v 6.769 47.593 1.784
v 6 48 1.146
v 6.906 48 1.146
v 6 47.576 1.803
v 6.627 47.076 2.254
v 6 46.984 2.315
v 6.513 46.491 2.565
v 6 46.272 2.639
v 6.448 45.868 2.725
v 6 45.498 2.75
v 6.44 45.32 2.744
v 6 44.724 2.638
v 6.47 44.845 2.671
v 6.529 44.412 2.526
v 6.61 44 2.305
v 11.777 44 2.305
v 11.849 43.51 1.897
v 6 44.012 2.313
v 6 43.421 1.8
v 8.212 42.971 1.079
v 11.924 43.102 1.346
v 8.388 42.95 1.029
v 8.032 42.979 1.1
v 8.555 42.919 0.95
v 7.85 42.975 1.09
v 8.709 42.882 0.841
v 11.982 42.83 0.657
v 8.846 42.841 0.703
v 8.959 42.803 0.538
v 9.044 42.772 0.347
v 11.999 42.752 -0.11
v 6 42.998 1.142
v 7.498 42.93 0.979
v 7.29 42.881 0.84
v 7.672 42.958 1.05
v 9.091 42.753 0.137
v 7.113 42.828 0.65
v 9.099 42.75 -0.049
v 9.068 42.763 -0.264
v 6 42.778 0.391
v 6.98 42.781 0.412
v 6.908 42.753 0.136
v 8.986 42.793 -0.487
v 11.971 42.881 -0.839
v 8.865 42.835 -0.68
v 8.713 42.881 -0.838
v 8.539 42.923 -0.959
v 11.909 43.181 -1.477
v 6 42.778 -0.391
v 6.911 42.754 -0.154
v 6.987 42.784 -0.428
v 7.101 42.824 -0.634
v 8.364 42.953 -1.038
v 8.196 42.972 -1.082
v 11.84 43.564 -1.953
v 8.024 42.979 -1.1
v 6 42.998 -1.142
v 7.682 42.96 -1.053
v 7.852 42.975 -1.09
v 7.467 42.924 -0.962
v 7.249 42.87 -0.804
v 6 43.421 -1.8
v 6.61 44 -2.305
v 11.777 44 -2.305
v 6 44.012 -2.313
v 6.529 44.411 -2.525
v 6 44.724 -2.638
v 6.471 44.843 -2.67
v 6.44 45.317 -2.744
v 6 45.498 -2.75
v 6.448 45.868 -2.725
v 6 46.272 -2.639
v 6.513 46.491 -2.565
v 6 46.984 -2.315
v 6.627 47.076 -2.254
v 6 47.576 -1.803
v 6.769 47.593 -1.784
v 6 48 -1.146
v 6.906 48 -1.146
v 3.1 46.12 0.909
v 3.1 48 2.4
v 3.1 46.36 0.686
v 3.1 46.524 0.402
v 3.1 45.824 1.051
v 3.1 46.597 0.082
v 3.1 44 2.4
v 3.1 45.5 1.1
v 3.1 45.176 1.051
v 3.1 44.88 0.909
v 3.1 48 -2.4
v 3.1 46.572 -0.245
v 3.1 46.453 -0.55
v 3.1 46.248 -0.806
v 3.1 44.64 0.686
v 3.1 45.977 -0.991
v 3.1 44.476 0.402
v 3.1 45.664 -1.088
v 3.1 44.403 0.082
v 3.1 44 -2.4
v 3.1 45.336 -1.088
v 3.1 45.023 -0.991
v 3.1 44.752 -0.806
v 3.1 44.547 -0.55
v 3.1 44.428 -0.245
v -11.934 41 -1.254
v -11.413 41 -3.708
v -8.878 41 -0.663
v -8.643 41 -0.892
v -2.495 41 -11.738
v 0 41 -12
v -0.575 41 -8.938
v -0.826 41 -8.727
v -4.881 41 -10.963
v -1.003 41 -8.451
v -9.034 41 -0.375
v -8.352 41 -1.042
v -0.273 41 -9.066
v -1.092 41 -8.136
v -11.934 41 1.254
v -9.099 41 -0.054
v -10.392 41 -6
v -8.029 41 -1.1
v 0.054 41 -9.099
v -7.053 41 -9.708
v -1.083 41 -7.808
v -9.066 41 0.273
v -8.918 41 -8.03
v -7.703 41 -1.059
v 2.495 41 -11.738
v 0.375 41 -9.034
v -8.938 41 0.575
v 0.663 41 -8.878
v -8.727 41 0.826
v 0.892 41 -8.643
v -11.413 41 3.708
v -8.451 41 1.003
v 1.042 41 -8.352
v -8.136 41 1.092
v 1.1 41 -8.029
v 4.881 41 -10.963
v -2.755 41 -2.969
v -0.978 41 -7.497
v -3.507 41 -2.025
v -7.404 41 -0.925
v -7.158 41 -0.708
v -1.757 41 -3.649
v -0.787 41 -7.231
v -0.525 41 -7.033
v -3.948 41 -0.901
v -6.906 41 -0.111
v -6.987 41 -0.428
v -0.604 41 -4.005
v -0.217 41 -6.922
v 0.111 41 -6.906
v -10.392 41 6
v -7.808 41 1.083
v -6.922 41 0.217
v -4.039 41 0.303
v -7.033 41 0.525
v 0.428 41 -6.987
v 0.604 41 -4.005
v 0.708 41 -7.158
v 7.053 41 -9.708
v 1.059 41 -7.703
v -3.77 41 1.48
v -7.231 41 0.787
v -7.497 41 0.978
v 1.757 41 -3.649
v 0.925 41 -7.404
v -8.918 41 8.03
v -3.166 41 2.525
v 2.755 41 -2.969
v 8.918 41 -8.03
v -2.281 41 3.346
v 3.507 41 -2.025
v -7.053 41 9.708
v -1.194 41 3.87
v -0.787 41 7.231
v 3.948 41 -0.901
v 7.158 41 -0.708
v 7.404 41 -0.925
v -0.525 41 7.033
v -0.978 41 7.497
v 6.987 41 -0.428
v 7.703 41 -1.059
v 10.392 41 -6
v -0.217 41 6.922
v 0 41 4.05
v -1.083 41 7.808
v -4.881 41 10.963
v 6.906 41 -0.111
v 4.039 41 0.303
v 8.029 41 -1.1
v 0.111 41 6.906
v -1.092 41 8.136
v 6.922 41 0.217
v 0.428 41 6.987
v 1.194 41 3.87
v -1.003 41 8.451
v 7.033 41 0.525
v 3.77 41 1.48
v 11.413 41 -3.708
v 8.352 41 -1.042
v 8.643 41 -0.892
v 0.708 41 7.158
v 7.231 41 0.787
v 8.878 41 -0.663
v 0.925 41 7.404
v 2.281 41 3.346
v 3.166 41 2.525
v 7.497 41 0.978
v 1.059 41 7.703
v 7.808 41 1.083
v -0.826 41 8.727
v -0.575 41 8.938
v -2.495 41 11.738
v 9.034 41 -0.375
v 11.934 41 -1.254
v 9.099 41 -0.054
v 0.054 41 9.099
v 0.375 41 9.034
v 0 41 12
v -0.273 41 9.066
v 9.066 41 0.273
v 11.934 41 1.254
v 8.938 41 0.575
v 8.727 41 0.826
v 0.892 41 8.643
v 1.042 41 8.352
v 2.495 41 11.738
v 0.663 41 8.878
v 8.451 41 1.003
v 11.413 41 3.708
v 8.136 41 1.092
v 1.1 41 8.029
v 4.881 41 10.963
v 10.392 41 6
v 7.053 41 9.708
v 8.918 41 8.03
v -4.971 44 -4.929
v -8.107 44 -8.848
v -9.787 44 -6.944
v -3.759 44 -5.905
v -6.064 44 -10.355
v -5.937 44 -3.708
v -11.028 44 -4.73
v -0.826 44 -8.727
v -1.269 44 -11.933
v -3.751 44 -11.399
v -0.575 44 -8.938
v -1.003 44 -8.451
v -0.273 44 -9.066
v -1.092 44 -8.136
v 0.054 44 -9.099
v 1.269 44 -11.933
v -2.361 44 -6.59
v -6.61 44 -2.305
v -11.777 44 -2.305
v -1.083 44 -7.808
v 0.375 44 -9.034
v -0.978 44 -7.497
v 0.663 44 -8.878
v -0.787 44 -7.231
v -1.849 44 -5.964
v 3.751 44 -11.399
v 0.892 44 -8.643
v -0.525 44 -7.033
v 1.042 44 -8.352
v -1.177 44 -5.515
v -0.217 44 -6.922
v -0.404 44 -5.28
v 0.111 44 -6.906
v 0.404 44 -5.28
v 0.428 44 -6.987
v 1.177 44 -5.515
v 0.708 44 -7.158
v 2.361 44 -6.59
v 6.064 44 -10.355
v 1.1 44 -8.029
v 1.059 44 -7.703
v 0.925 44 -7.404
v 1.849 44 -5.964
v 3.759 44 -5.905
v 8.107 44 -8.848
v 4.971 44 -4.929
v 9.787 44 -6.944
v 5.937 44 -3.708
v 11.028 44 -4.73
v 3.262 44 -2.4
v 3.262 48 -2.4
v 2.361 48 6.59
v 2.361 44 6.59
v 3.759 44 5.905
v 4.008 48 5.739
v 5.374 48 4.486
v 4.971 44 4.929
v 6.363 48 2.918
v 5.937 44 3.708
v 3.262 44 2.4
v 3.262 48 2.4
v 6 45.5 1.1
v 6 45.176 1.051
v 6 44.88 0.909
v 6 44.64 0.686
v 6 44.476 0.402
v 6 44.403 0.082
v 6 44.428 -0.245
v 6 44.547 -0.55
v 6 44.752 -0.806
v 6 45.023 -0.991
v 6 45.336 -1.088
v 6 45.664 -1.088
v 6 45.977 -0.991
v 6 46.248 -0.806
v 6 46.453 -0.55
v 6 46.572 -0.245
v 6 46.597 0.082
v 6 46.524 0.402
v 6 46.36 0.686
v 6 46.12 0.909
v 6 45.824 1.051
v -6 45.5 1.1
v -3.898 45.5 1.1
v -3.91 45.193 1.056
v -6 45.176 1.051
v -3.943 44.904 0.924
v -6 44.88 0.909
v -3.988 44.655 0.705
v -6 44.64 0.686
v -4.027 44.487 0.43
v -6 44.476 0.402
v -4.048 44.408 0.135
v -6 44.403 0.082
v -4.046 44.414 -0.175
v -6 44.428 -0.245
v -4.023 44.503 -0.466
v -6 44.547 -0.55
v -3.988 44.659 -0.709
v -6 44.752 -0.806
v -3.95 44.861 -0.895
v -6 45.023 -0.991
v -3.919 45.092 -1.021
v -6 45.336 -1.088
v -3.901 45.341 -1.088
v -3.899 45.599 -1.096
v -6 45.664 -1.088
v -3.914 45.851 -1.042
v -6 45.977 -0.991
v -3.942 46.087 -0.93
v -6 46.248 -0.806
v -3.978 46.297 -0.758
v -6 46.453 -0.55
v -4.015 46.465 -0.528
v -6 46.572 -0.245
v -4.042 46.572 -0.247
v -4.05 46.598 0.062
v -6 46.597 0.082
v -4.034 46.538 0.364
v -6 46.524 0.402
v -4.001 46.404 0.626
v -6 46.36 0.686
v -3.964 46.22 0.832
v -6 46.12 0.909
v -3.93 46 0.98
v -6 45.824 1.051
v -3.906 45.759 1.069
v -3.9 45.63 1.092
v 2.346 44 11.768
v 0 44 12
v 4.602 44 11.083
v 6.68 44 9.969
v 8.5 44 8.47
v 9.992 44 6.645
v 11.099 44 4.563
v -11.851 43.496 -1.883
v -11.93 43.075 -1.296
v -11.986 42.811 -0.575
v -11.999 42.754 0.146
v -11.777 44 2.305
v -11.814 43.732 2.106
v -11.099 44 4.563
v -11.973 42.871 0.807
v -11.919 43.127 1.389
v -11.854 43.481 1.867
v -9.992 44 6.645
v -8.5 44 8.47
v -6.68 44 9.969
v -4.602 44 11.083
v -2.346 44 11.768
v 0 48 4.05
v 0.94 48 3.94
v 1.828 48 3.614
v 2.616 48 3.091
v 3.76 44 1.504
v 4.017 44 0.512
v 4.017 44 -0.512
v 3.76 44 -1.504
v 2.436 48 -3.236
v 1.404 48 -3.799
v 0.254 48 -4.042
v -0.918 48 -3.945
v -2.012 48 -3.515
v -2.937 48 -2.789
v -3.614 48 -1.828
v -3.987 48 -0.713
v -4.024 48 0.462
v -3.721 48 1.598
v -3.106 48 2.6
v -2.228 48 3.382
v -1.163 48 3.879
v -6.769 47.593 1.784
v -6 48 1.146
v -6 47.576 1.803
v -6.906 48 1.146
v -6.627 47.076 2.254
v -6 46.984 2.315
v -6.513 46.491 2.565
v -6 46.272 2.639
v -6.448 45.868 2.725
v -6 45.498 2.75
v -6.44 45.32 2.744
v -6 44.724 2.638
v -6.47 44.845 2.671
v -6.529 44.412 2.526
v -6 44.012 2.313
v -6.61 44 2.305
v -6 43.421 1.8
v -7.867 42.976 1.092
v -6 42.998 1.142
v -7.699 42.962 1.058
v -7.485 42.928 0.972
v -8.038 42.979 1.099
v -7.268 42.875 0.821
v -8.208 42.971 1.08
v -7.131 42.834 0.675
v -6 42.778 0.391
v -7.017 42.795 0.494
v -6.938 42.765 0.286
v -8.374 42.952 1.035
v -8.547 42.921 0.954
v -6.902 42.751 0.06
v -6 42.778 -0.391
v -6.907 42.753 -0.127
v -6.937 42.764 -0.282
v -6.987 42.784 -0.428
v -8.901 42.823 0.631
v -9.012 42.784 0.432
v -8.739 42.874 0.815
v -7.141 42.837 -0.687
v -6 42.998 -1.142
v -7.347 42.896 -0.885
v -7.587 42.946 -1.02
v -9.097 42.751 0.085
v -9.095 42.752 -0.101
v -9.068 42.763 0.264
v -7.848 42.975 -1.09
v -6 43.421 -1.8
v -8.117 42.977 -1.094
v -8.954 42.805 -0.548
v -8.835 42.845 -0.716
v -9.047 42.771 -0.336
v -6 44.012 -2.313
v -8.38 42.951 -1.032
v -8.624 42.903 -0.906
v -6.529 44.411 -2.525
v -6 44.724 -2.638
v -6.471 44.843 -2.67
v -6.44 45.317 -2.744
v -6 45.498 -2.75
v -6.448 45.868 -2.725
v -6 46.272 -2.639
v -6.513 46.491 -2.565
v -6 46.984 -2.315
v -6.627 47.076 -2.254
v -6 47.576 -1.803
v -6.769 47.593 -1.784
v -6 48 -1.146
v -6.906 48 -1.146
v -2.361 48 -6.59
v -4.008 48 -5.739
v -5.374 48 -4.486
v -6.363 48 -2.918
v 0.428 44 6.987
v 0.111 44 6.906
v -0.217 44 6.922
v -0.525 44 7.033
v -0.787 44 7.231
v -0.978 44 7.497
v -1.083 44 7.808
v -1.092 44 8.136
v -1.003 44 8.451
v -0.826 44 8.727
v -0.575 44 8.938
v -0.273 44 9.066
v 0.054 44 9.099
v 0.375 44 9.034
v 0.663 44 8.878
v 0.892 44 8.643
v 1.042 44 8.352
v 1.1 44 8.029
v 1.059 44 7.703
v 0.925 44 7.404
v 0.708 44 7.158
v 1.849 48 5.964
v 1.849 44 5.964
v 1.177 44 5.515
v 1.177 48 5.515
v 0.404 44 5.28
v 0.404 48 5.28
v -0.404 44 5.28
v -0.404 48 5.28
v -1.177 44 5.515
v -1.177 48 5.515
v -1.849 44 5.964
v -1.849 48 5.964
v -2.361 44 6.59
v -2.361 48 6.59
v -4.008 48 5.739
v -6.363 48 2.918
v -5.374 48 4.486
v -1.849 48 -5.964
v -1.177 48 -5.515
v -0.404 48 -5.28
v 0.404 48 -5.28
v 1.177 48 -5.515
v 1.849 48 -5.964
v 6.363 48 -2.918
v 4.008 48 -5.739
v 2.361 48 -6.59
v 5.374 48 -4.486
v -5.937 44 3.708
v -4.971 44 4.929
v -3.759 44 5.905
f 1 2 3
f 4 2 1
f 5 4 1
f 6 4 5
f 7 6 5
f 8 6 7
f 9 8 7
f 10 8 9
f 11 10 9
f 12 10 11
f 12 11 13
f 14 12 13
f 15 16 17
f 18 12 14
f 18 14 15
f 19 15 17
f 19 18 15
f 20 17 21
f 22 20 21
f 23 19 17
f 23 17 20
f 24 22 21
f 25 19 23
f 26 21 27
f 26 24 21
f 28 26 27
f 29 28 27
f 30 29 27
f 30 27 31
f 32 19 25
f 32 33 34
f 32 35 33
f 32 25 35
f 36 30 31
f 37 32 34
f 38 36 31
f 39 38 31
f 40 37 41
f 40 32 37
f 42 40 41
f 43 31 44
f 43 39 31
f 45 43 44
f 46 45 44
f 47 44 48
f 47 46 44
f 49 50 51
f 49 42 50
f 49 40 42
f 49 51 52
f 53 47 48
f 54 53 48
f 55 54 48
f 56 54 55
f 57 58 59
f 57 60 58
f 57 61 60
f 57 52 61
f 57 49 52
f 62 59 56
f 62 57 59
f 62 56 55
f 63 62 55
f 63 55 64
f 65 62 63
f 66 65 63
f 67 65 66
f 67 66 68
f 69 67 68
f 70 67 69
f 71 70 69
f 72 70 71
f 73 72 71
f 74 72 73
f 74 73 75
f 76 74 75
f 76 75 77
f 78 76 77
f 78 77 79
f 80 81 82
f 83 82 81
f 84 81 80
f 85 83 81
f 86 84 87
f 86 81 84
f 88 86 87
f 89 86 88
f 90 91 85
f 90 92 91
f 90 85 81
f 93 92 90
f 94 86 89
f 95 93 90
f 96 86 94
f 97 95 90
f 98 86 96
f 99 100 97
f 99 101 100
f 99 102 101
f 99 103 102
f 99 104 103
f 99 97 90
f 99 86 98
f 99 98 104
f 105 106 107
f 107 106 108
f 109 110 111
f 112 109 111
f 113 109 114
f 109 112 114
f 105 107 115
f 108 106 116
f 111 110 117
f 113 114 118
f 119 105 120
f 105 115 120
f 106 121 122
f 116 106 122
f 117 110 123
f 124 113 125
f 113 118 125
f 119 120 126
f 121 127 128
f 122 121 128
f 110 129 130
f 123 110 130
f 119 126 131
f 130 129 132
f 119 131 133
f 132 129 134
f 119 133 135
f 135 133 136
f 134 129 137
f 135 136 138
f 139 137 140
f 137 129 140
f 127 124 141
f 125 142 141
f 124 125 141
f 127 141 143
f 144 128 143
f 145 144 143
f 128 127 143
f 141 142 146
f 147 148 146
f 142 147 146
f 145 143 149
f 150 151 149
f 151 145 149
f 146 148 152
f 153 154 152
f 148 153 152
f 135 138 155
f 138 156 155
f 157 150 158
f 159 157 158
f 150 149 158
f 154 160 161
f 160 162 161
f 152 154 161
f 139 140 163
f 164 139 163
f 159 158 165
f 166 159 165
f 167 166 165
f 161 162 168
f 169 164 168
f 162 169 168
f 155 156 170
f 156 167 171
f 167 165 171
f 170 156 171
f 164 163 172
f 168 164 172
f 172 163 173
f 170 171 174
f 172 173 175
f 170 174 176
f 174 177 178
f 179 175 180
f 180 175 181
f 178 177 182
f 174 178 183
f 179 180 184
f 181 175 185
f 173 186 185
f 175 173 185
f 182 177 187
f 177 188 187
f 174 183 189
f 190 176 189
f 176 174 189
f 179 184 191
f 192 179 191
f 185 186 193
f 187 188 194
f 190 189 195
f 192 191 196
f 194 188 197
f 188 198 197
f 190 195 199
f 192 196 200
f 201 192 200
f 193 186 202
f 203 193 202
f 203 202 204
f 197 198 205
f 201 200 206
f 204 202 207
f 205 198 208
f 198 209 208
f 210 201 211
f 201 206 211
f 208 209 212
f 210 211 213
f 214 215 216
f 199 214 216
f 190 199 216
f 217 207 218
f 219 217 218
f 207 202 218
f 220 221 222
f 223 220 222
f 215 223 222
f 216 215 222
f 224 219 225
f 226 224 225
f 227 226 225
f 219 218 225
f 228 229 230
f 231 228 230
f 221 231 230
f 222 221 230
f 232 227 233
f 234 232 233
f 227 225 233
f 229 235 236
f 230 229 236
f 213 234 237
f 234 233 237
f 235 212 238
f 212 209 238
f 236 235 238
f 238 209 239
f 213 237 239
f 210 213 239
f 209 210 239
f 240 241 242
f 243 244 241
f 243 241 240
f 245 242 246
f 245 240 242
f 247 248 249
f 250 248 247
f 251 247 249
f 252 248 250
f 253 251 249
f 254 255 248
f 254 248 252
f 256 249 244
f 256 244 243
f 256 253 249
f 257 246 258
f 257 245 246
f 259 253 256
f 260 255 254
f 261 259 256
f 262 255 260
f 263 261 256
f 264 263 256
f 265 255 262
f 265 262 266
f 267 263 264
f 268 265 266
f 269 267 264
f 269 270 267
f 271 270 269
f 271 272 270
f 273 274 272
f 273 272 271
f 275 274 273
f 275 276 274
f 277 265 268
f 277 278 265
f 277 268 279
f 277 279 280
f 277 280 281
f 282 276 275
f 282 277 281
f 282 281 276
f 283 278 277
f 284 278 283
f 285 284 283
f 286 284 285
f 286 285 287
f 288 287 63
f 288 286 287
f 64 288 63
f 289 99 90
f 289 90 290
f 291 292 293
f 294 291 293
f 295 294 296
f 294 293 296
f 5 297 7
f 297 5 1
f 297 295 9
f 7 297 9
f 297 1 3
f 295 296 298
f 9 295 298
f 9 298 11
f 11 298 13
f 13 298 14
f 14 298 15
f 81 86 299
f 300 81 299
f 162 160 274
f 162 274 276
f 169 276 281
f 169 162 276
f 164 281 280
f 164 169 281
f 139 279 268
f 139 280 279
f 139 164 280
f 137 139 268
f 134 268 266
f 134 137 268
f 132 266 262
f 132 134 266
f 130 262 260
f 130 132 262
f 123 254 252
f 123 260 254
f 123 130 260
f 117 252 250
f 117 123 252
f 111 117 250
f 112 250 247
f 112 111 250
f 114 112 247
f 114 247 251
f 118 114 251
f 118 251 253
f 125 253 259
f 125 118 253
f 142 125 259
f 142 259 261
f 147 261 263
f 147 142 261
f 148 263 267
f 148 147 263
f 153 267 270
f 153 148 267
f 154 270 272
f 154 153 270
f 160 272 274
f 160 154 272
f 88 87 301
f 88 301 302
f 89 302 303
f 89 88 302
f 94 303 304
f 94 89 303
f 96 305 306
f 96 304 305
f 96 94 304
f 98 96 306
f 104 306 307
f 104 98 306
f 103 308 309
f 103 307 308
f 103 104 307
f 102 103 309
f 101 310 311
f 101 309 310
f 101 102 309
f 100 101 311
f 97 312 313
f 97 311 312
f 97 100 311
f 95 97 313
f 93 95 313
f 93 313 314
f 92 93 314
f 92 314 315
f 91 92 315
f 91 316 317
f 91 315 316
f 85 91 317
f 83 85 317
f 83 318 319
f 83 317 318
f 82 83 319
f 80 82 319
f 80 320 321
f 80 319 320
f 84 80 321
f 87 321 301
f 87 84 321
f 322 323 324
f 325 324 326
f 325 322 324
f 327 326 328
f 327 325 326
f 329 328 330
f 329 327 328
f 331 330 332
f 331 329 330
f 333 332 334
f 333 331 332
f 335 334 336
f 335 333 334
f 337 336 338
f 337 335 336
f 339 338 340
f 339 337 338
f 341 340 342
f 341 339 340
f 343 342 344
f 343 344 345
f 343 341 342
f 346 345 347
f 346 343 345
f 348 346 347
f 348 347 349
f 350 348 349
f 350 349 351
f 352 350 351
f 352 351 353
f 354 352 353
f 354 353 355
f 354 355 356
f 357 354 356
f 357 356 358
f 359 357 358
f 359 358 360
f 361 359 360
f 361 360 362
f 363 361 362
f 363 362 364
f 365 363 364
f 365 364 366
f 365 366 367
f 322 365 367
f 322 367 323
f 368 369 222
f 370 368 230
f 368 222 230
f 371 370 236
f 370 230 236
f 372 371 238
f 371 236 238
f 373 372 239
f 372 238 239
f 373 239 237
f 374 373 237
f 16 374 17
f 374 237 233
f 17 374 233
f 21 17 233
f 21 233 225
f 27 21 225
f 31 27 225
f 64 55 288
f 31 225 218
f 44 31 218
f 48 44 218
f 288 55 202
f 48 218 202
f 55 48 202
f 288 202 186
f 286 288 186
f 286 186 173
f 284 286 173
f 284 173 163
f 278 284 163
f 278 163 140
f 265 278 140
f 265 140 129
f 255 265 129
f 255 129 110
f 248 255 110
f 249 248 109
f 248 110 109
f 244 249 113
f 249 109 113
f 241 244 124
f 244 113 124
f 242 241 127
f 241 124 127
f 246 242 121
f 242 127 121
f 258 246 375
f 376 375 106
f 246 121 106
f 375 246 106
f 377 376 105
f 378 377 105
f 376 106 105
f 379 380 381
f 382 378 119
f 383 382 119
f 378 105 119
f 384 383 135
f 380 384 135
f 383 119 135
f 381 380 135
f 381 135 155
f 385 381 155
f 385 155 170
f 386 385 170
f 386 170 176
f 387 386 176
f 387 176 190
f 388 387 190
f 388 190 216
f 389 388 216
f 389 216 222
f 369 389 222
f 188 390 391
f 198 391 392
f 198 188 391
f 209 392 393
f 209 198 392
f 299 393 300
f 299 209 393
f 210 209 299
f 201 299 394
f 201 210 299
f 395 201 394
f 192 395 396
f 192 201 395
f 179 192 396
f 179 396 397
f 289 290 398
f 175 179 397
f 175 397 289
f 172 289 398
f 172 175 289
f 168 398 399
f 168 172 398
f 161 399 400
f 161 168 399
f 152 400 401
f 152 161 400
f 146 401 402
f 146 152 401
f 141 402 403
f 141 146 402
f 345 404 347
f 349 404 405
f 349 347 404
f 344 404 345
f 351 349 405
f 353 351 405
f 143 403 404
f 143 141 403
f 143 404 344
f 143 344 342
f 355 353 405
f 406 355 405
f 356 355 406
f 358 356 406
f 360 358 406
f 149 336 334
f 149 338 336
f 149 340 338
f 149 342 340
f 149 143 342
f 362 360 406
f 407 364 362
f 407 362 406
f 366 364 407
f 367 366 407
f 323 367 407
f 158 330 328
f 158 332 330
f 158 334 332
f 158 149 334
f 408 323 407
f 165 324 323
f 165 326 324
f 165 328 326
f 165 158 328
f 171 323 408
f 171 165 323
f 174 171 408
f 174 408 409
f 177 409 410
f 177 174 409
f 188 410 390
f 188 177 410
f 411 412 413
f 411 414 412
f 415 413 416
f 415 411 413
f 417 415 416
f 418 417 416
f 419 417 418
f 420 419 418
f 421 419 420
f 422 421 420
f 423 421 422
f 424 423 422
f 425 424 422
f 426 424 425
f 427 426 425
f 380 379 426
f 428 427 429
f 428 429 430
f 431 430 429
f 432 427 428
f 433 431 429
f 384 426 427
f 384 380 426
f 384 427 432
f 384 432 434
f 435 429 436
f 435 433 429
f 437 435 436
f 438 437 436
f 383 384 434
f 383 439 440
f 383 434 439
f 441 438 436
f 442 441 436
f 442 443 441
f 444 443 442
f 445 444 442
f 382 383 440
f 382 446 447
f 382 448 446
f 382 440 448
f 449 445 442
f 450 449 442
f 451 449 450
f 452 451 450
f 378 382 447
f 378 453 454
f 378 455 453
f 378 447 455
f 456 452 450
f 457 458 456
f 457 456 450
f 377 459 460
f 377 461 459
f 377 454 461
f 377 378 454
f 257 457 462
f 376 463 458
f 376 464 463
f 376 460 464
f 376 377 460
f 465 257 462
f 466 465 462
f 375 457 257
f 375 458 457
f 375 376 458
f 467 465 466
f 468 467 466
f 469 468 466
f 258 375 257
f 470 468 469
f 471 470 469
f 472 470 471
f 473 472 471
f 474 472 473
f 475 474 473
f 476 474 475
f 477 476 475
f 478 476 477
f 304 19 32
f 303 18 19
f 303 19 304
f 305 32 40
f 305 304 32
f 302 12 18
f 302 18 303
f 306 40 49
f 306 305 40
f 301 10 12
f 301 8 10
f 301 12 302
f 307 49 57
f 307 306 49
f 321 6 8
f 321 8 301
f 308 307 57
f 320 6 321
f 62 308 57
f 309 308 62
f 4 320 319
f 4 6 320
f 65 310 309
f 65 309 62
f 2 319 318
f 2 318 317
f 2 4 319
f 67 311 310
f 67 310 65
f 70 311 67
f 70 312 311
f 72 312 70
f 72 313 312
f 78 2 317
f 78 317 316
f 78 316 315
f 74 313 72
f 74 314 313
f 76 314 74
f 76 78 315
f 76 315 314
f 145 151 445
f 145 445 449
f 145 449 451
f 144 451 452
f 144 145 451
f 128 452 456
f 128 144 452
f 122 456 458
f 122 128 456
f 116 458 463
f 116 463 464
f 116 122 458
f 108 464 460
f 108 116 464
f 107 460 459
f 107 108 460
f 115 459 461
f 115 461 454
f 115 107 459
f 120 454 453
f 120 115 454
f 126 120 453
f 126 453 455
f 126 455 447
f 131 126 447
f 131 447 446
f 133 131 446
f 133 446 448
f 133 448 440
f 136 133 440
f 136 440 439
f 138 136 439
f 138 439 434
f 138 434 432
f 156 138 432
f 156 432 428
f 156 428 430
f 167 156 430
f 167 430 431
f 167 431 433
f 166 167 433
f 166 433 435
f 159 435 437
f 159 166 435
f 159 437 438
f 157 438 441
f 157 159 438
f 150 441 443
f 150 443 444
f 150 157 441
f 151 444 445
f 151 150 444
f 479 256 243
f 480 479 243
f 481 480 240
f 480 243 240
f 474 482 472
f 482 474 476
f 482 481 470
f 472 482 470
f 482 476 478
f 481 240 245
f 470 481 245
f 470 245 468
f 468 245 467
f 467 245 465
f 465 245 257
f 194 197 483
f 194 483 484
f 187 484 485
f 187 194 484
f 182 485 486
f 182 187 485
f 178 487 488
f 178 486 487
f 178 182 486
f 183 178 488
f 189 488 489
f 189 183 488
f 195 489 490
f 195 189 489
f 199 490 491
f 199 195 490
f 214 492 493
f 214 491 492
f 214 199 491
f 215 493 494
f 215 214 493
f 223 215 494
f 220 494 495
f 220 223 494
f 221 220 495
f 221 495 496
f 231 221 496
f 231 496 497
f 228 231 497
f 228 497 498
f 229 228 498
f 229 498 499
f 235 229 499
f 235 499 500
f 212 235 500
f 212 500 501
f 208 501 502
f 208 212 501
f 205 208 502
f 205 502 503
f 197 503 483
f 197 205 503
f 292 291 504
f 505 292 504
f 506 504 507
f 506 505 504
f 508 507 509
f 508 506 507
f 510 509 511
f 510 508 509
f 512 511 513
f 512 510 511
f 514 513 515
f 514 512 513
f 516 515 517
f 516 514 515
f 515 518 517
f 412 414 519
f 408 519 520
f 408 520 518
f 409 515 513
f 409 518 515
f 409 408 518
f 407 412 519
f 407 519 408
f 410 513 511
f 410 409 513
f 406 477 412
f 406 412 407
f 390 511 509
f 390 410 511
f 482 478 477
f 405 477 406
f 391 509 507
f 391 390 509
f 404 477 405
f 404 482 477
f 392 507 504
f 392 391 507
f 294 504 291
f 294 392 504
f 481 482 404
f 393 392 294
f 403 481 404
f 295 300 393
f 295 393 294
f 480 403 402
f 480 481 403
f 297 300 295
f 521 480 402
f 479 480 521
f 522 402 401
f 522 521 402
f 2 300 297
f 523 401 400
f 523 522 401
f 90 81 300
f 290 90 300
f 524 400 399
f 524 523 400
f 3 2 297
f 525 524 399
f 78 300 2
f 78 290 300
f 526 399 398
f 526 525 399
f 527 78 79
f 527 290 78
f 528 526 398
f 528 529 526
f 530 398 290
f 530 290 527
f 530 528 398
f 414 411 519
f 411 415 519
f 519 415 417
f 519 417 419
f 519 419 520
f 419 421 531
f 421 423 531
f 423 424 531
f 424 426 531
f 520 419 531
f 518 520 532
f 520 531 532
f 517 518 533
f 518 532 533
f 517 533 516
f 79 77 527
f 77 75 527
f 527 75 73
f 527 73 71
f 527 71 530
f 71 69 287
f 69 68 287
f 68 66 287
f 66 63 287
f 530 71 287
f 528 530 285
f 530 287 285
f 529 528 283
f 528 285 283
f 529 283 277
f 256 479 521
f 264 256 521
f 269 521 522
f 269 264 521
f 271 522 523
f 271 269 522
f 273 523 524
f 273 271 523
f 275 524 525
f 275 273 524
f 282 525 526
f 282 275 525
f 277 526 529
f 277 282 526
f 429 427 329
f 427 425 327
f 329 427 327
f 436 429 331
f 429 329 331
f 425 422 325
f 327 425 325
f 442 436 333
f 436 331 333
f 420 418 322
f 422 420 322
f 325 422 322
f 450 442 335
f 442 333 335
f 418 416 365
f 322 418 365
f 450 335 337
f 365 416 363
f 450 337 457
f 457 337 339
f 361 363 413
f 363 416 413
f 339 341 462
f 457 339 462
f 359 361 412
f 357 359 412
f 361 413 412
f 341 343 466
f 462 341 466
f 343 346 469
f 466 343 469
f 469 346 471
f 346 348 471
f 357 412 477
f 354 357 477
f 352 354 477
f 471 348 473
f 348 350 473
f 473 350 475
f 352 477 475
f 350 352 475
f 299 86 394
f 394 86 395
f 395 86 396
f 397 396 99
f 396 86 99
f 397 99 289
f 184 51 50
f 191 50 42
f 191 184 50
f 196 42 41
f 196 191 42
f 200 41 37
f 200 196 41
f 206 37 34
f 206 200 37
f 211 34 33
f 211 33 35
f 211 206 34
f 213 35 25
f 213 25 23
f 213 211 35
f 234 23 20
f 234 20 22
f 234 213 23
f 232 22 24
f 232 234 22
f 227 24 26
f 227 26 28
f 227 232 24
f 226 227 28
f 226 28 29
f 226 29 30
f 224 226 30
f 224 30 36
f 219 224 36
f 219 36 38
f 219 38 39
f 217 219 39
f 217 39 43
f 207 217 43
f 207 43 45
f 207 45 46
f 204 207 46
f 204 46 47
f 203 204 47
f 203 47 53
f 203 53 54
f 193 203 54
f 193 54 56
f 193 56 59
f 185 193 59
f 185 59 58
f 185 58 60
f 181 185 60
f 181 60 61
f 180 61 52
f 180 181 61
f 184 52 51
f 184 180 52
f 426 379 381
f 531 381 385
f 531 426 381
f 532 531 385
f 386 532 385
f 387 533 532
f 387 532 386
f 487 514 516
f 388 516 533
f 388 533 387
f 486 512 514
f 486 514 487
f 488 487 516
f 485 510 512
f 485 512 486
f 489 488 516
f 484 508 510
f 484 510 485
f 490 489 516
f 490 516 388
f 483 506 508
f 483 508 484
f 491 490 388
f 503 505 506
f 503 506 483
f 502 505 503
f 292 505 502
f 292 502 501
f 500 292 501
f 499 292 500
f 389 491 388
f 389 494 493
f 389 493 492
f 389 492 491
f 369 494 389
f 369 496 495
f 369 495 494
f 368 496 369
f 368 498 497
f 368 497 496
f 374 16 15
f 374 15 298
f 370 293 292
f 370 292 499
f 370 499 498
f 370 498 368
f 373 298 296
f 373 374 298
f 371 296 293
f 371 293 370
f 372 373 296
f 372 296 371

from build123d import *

# Parameters (mm, degrees)
STOCK_HORN_DRIVE_FLANGE_START              = 41
STOCK_HORN_DRIVE_FLANGE_PROFILE_R          = 12
STOCK_HORN_DRIVE_FLANGE_PROFILE_R_2        = 4.05
STOCK_HORN_DRIVE_FLANGE_DEPTH              = 3
D_COUPLING_RING_START                      = 44
D_COUPLING_RING_PROFILE_R                  = 7
D_COUPLING_RING_PROFILE_R_2                = 4.05
D_COUPLING_RING_DEPTH                      = 4
D_KEY_LAND_START                           = 44
D_KEY_LAND_PROFILE_W                       = 2.9
D_KEY_LAND_PROFILE_H                       = 4.8
D_KEY_LAND_DEPTH                           = 4
STOCK_HORN_SCREWS_START                    = 39
STOCK_HORN_SCREWS_PROFILE_R                = 1.1
STOCK_HORN_SCREWS_DEPTH                    = 12.911688245
TWO_HORN_WASHER_CLEARANCES_START           = 44
TWO_HORN_WASHER_CLEARANCES_PROFILE_R       = 2.75
TWO_HORN_WASHER_CLEARANCES_DEPTH           = 4
YAW_POSITIVE_RETENTION_CROSSBOLT_START     = -10
YAW_POSITIVE_RETENTION_CROSSBOLT_PROFILE_R = 1.1
YAW_POSITIVE_RETENTION_CROSSBOLT_DEPTH     = 61.911688245
CROSSBOLT_FLAT_SEAT_CUT_12_START           = -12
CROSSBOLT_FLAT_SEAT_12_R                   = 2.75
CROSSBOLT_FLAT_SEAT_CUT_12_DEPTH           = 6
CROSSBOLT_FLAT_SEAT_CUT_6_START            = 6
CROSSBOLT_FLAT_SEAT_6_R                    = 2.75
CROSSBOLT_FLAT_SEAT_CUT_6_DEPTH            = 6


with BuildPart() as part:
    # Stock_horn_drive_flange_profile → Stock_horn_drive_flange (new body)
    with BuildSketch(Plane(origin=(0, 0, 0), x_dir=(1, 0, 0), z_dir=(0, 1, 0)).offset(STOCK_HORN_DRIVE_FLANGE_START)):
        with Locations(Location((0, 0, 0), (0, 0, 270))):
            Circle(STOCK_HORN_DRIVE_FLANGE_PROFILE_R)
        with Locations(Location((0, 0, 0), (0, 0, 270))):
            Circle(STOCK_HORN_DRIVE_FLANGE_PROFILE_R_2, mode=Mode.SUBTRACT)
    extrude(amount=STOCK_HORN_DRIVE_FLANGE_DEPTH)

    # D_coupling_ring_profile → D_coupling_ring (add)
    with BuildSketch(Plane(origin=(0, 0, 0), x_dir=(1, 0, 0), z_dir=(0, 1, 0)).offset(D_COUPLING_RING_START)):
        with Locations(Location((0, 0, 0), (0, 0, 270))):
            Circle(D_COUPLING_RING_PROFILE_R)
        with Locations(Location((0, 0, 0), (0, 0, 270))):
            Circle(D_COUPLING_RING_PROFILE_R_2, mode=Mode.SUBTRACT)
    extrude(amount=D_COUPLING_RING_DEPTH)

    # D_key_land_profile → D_key_land (add)
    with BuildSketch(Plane(origin=(0, 0, 0), x_dir=(1, 0, 0), z_dir=(0, 1, 0)).offset(D_KEY_LAND_START)):
        with Locations((4.55, 0)):
            Rectangle(D_KEY_LAND_PROFILE_W, D_KEY_LAND_PROFILE_H)
    extrude(amount=D_KEY_LAND_DEPTH)

    # Stock_horn_screws_profile → Stock_horn_screws (cut, through all)
    with BuildSketch(Plane(origin=(0, 0, 0), x_dir=(1, 0, 0), z_dir=(0, 1, 0)).offset(STOCK_HORN_SCREWS_START)):
        with Locations(Location((-8, 0, 0), (0, 0, 22.9239414))):
            Circle(STOCK_HORN_SCREWS_PROFILE_R)
        with Locations(Location((8, 0, 0), (0, 0, 157.0760586))):
            Circle(STOCK_HORN_SCREWS_PROFILE_R)
        with Locations(Location((0, -8, 0), (0, 0, 67.0760586))):
            Circle(STOCK_HORN_SCREWS_PROFILE_R)
        with Locations(Location((0, 8, 0), (0, 0, 292.9239414))):
            Circle(STOCK_HORN_SCREWS_PROFILE_R)
    extrude(amount=STOCK_HORN_SCREWS_DEPTH, mode=Mode.SUBTRACT)

    # Two_horn_washer_clearances_profile → Two_horn_washer_clearances (cut)
    with BuildSketch(Plane(origin=(0, 0, 0), x_dir=(1, 0, 0), z_dir=(0, 1, 0)).offset(TWO_HORN_WASHER_CLEARANCES_START)):
        with Locations((0, -8)):
            Circle(TWO_HORN_WASHER_CLEARANCES_PROFILE_R)
        with Locations((0, 8)):
            Circle(TWO_HORN_WASHER_CLEARANCES_PROFILE_R)
    extrude(amount=TWO_HORN_WASHER_CLEARANCES_DEPTH, mode=Mode.SUBTRACT)

    # Yaw_positive_retention_crossbolt_profile → Yaw_positive_retention_crossbolt (cut, through all)
    with BuildSketch(Plane(origin=(0, 0, 0), x_dir=(0, 0, -1), z_dir=(1, 0, 0)).offset(YAW_POSITIVE_RETENTION_CROSSBOLT_START)):
        with Locations(Location((0, 45.5, 0), (0, 0, 180))):
            Circle(YAW_POSITIVE_RETENTION_CROSSBOLT_PROFILE_R)
    extrude(amount=YAW_POSITIVE_RETENTION_CROSSBOLT_DEPTH, mode=Mode.SUBTRACT)

    # Crossbolt_flat_seat_-12 → Crossbolt_flat_seat_cut_-12 (cut)
    with BuildSketch(Plane(origin=(0, 0, 0), x_dir=(0, 0, -1), z_dir=(1, 0, 0)).offset(CROSSBOLT_FLAT_SEAT_CUT_12_START)):
        with Locations((0, 45.5)):
            Circle(CROSSBOLT_FLAT_SEAT_12_R)
    extrude(amount=CROSSBOLT_FLAT_SEAT_CUT_12_DEPTH, mode=Mode.SUBTRACT)

    # Crossbolt_flat_seat_6 → Crossbolt_flat_seat_cut_6 (cut)
    with BuildSketch(Plane(origin=(0, 0, 0), x_dir=(0, 0, -1), z_dir=(1, 0, 0)).offset(CROSSBOLT_FLAT_SEAT_CUT_6_START)):
        with Locations((0, 45.5)):
            Circle(CROSSBOLT_FLAT_SEAT_6_R)
    extrude(amount=CROSSBOLT_FLAT_SEAT_CUT_6_DEPTH, mode=Mode.SUBTRACT)


solid = part.part
